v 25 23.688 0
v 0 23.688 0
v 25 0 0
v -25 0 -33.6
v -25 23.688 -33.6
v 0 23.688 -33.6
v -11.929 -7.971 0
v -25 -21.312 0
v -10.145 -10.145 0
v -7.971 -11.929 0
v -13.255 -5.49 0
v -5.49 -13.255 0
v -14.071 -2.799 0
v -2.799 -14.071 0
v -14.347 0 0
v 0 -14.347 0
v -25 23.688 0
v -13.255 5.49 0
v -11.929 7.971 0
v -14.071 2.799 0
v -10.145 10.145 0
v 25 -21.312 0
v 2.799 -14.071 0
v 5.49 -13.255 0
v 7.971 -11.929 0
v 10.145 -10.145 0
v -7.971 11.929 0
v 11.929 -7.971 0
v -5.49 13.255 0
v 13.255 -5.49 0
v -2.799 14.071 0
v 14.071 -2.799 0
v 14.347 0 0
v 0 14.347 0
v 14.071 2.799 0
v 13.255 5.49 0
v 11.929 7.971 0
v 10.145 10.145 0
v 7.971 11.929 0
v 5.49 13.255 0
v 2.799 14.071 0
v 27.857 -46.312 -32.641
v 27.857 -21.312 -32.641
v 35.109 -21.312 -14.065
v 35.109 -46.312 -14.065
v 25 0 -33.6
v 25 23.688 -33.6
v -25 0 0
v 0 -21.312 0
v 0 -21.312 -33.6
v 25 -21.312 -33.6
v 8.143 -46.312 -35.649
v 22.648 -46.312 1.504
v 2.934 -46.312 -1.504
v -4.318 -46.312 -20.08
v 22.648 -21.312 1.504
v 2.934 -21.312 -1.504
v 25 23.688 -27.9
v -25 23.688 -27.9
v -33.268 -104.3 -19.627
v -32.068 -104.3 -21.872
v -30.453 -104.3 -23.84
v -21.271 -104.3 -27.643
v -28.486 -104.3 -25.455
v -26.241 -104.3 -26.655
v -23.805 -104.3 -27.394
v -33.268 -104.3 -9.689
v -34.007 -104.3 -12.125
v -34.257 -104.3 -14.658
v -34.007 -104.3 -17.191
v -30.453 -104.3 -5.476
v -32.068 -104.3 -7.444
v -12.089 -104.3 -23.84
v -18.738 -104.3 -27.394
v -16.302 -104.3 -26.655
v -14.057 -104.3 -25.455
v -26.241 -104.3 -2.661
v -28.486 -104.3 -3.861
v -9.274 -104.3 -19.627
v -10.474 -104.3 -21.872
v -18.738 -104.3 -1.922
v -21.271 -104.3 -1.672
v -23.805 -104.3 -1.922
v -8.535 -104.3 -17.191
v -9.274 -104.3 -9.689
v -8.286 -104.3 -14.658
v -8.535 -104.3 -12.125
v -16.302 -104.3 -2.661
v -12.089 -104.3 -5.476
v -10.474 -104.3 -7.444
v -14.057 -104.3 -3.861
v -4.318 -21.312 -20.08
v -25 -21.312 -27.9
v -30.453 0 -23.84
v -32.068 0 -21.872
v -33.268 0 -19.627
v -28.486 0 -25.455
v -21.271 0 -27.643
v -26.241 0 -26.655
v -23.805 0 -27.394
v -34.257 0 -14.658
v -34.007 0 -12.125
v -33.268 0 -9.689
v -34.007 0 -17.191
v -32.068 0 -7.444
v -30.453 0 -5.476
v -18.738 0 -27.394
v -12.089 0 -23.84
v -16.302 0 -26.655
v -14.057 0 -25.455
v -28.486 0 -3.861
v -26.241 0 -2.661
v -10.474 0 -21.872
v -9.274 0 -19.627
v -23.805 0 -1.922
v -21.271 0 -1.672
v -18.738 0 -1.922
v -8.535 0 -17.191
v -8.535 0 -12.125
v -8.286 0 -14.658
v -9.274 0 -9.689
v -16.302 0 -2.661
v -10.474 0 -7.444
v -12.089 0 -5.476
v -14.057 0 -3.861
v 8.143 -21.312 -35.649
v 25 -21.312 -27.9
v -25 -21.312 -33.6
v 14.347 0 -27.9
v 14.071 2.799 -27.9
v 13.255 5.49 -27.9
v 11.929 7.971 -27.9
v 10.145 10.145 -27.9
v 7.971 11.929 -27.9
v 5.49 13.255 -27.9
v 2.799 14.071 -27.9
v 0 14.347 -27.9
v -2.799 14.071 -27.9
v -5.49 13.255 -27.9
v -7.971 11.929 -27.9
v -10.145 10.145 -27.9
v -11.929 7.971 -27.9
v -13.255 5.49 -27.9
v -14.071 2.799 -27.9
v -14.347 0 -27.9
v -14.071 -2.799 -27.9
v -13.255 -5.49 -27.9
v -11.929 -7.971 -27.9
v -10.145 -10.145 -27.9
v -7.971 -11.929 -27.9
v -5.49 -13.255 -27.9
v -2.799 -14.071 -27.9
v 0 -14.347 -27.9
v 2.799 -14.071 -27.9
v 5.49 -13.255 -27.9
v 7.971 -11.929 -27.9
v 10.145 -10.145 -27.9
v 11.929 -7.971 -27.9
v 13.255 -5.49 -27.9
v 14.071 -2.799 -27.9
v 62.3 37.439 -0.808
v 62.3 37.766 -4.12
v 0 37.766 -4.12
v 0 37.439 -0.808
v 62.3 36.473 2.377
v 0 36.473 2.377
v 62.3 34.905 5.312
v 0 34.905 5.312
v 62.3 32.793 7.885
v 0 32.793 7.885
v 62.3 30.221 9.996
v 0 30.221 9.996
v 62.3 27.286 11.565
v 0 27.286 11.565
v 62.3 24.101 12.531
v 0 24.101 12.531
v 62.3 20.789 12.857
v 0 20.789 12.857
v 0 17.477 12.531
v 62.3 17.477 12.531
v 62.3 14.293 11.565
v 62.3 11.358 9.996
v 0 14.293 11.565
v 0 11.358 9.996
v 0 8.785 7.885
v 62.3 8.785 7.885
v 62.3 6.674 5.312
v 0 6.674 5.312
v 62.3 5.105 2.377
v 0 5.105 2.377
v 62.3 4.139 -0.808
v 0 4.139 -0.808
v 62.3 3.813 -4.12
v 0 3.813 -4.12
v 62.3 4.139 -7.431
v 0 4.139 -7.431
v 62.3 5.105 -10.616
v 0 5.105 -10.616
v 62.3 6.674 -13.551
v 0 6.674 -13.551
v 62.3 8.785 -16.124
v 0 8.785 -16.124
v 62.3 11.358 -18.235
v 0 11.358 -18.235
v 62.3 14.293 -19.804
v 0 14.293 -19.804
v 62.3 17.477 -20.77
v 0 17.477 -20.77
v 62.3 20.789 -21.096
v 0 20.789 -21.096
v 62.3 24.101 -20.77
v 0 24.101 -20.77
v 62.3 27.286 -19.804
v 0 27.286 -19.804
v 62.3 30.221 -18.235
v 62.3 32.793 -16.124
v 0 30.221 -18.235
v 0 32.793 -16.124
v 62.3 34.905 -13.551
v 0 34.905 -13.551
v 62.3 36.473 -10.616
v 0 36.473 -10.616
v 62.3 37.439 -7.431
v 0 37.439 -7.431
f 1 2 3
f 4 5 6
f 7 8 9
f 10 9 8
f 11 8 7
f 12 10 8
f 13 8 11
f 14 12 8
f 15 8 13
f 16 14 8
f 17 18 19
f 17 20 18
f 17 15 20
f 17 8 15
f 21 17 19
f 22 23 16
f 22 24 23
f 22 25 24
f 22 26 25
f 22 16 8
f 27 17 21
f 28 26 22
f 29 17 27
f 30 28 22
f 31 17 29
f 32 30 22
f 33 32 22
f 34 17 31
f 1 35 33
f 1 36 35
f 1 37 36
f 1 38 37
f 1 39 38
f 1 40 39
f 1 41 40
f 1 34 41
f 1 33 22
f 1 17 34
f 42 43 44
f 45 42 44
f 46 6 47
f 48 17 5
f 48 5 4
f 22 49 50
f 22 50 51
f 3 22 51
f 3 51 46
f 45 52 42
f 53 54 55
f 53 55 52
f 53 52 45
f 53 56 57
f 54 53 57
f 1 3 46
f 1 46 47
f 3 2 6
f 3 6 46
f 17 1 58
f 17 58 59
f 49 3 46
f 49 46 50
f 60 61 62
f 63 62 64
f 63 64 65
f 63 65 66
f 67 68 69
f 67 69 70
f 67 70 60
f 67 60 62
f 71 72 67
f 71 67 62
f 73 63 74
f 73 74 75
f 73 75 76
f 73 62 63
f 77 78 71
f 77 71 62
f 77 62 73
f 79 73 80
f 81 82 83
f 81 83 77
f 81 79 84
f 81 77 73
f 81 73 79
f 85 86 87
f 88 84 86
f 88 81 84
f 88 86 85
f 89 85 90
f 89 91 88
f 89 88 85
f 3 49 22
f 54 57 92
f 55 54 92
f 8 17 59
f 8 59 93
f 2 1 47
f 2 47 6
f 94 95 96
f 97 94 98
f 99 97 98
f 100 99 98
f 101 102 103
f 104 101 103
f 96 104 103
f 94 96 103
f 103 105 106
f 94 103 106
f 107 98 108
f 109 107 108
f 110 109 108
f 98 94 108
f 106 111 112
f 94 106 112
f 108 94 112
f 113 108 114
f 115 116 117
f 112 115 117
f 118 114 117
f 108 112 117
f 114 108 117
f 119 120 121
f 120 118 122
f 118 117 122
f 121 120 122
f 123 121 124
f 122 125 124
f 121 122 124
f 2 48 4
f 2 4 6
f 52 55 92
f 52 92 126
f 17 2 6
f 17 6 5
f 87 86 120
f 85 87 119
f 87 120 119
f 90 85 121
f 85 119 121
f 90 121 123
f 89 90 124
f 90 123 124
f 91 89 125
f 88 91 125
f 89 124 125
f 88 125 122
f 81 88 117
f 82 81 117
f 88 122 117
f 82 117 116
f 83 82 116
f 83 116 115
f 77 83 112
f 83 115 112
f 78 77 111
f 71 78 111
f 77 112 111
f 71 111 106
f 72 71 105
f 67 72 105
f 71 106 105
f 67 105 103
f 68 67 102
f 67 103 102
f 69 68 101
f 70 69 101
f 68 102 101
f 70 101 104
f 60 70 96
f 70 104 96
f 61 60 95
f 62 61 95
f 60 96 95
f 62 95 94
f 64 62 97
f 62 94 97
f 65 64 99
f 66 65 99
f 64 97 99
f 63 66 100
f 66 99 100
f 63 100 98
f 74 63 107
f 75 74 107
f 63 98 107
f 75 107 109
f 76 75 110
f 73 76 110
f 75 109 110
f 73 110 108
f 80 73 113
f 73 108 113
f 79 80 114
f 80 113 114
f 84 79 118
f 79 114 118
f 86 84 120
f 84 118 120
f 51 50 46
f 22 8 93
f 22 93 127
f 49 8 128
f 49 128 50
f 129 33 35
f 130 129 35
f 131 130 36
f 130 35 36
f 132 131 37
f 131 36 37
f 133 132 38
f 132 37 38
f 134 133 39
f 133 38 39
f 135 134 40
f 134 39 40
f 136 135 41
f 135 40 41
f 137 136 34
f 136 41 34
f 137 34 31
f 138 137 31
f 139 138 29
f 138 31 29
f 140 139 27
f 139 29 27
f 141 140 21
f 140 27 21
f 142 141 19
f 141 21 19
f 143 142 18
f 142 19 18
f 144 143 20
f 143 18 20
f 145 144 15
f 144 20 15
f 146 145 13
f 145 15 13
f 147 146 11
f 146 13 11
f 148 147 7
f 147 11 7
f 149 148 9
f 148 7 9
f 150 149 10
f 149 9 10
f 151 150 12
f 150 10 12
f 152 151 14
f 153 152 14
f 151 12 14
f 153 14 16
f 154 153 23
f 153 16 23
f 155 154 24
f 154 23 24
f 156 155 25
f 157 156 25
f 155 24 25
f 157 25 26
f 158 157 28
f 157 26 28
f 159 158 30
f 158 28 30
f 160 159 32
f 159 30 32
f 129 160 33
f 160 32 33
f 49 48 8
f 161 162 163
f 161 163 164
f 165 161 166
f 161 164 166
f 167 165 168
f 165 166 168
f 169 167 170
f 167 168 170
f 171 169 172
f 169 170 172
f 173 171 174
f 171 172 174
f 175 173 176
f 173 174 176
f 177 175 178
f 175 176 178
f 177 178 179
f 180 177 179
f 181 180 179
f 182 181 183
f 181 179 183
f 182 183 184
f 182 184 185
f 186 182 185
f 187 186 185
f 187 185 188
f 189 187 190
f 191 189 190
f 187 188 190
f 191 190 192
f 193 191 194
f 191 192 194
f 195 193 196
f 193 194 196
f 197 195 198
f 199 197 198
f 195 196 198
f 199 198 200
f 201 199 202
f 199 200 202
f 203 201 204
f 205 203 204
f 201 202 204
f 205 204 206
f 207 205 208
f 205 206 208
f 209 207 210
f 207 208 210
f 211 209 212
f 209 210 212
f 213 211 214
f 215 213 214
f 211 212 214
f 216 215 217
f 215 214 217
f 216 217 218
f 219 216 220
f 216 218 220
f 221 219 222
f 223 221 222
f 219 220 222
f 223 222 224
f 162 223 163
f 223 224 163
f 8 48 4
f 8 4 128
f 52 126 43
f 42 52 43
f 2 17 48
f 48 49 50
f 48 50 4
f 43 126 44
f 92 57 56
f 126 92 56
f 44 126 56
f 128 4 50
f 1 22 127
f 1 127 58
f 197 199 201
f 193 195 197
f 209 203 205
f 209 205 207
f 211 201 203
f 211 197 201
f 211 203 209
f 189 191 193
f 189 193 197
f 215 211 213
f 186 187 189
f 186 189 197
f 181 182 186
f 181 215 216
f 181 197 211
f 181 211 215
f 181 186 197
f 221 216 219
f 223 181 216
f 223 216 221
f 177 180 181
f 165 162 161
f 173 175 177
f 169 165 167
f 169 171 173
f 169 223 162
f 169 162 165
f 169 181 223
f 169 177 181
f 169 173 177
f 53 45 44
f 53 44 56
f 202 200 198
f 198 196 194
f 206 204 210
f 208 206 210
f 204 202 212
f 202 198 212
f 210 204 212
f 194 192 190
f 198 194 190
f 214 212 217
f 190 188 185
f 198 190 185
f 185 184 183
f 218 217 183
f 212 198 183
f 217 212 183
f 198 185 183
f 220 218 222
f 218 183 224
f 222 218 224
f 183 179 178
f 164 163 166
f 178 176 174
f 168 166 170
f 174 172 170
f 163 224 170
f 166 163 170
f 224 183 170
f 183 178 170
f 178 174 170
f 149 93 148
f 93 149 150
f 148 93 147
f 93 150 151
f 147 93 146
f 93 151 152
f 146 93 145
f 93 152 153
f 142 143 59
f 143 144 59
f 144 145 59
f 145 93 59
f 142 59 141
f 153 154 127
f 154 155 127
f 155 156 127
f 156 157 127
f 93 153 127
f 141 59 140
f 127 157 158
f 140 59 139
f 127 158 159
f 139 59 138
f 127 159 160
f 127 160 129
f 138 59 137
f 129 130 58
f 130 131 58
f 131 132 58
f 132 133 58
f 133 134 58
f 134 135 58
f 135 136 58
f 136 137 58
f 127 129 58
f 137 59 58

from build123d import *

# Parameters (mm, degrees)
F1_DEPTH = 33.6
F0_R     = 14.3467874304
F2_DEPTH = 27.9
F3_R     = 16.9763209657
F4_DEPTH = 62.3
F5_R     = 12.9854580223
F6_DEPTH = 104.3
F8_DEPTH = 25


with BuildPart() as f1:
    # F0 (on Top) → F1 (new body)
    with BuildSketch(Plane.XY):
        Polygon((-1.8626e-06, 23.6883324424), (-25.0000018626, 23.6883324424), (-25.0000018626, 0), align=None)
    extrude(amount=-F1_DEPTH)


with BuildPart() as f1b:
    # F0 (on Top) → F1, piece 2 (new body)
    with BuildSketch(Plane.XY):
        Polygon((24.9999981374, 23.6883324424), (-1.8626e-06, 23.6883324424), (24.9999981374, 0), align=None)
    extrude(amount=-F1_DEPTH)


with BuildPart() as f1c:
    # F0 (on Top) → F1, piece 3 (new body)
    with BuildSketch(Plane.XY):
        Polygon((-1.8626e-06, -21.3116675576), (-25.0000018626, 0), (-25.0000018626, -21.3116675576), align=None)
    extrude(amount=-F1_DEPTH)


with BuildPart() as f1d:
    # F0 (on Top) → F1, piece 4 (new body)
    with BuildSketch(Plane.XY):
        Polygon((24.9999981374, -21.3116675576), (24.9999981374, 0), (-1.8626e-06, -21.3116675576), align=None)
    extrude(amount=-F1_DEPTH)


with BuildPart() as f2:
    # F0 (on Top) → F2 (new body)
    with BuildSketch(Plane.XY):
        Polygon((-1.8626e-06, 23.6883324424), (-25.0000018626, 23.6883324424), (-25.0000018626, 0), align=None)
        Polygon((24.9999981374, 0), (-1.8626e-06, 23.6883324424), (-25.0000018626, 0), (-1.8626e-06, -21.3116675576), align=None)
        Circle(F0_R, mode=Mode.SUBTRACT)
        Polygon((24.9999981374, 23.6883324424), (-1.8626e-06, 23.6883324424), (24.9999981374, 0), align=None)
        Polygon((-1.8626e-06, -21.3116675576), (-25.0000018626, 0), (-25.0000018626, -21.3116675576), align=None)
        Polygon((24.9999981374, -21.3116675576), (24.9999981374, 0), (-1.8626e-06, -21.3116675576), align=None)
    extrude(amount=-F2_DEPTH)


with BuildPart() as f4:
    # F3 (on Right) → F4 (new body)
    with BuildSketch(Plane.YZ):
        with Locations((20.7892358303, -4.1195256636)):
            Circle(F3_R)
    extrude(amount=F4_DEPTH)


with BuildPart() as f6:
    # F5 (on Front) → F6 (new body)
    with BuildSketch(Plane.XZ):
        with Locations((-21.2712734938, -14.6578475833)):
            Circle(F5_R)
    extrude(amount=F6_DEPTH)


with BuildPart() as f8:
    # F7 (on face) → F8 (new body)
    with BuildSketch(Plane.XZ.offset(21.3116675576)):
        Polygon((22.6479356358, 1.503792345), (2.9341916372, -1.503792345), (-4.3180356165, -20.0801877965), (8.1434811284, -35.648998558), (27.857225127, -32.641413868), (35.1094523807, -14.0650184165), align=None)
    extrude(amount=F8_DEPTH)


solid = Compound([f1.part, f1b.part, f1c.part, f1d.part, f2.part, f4.part, f6.part, f8.part])
